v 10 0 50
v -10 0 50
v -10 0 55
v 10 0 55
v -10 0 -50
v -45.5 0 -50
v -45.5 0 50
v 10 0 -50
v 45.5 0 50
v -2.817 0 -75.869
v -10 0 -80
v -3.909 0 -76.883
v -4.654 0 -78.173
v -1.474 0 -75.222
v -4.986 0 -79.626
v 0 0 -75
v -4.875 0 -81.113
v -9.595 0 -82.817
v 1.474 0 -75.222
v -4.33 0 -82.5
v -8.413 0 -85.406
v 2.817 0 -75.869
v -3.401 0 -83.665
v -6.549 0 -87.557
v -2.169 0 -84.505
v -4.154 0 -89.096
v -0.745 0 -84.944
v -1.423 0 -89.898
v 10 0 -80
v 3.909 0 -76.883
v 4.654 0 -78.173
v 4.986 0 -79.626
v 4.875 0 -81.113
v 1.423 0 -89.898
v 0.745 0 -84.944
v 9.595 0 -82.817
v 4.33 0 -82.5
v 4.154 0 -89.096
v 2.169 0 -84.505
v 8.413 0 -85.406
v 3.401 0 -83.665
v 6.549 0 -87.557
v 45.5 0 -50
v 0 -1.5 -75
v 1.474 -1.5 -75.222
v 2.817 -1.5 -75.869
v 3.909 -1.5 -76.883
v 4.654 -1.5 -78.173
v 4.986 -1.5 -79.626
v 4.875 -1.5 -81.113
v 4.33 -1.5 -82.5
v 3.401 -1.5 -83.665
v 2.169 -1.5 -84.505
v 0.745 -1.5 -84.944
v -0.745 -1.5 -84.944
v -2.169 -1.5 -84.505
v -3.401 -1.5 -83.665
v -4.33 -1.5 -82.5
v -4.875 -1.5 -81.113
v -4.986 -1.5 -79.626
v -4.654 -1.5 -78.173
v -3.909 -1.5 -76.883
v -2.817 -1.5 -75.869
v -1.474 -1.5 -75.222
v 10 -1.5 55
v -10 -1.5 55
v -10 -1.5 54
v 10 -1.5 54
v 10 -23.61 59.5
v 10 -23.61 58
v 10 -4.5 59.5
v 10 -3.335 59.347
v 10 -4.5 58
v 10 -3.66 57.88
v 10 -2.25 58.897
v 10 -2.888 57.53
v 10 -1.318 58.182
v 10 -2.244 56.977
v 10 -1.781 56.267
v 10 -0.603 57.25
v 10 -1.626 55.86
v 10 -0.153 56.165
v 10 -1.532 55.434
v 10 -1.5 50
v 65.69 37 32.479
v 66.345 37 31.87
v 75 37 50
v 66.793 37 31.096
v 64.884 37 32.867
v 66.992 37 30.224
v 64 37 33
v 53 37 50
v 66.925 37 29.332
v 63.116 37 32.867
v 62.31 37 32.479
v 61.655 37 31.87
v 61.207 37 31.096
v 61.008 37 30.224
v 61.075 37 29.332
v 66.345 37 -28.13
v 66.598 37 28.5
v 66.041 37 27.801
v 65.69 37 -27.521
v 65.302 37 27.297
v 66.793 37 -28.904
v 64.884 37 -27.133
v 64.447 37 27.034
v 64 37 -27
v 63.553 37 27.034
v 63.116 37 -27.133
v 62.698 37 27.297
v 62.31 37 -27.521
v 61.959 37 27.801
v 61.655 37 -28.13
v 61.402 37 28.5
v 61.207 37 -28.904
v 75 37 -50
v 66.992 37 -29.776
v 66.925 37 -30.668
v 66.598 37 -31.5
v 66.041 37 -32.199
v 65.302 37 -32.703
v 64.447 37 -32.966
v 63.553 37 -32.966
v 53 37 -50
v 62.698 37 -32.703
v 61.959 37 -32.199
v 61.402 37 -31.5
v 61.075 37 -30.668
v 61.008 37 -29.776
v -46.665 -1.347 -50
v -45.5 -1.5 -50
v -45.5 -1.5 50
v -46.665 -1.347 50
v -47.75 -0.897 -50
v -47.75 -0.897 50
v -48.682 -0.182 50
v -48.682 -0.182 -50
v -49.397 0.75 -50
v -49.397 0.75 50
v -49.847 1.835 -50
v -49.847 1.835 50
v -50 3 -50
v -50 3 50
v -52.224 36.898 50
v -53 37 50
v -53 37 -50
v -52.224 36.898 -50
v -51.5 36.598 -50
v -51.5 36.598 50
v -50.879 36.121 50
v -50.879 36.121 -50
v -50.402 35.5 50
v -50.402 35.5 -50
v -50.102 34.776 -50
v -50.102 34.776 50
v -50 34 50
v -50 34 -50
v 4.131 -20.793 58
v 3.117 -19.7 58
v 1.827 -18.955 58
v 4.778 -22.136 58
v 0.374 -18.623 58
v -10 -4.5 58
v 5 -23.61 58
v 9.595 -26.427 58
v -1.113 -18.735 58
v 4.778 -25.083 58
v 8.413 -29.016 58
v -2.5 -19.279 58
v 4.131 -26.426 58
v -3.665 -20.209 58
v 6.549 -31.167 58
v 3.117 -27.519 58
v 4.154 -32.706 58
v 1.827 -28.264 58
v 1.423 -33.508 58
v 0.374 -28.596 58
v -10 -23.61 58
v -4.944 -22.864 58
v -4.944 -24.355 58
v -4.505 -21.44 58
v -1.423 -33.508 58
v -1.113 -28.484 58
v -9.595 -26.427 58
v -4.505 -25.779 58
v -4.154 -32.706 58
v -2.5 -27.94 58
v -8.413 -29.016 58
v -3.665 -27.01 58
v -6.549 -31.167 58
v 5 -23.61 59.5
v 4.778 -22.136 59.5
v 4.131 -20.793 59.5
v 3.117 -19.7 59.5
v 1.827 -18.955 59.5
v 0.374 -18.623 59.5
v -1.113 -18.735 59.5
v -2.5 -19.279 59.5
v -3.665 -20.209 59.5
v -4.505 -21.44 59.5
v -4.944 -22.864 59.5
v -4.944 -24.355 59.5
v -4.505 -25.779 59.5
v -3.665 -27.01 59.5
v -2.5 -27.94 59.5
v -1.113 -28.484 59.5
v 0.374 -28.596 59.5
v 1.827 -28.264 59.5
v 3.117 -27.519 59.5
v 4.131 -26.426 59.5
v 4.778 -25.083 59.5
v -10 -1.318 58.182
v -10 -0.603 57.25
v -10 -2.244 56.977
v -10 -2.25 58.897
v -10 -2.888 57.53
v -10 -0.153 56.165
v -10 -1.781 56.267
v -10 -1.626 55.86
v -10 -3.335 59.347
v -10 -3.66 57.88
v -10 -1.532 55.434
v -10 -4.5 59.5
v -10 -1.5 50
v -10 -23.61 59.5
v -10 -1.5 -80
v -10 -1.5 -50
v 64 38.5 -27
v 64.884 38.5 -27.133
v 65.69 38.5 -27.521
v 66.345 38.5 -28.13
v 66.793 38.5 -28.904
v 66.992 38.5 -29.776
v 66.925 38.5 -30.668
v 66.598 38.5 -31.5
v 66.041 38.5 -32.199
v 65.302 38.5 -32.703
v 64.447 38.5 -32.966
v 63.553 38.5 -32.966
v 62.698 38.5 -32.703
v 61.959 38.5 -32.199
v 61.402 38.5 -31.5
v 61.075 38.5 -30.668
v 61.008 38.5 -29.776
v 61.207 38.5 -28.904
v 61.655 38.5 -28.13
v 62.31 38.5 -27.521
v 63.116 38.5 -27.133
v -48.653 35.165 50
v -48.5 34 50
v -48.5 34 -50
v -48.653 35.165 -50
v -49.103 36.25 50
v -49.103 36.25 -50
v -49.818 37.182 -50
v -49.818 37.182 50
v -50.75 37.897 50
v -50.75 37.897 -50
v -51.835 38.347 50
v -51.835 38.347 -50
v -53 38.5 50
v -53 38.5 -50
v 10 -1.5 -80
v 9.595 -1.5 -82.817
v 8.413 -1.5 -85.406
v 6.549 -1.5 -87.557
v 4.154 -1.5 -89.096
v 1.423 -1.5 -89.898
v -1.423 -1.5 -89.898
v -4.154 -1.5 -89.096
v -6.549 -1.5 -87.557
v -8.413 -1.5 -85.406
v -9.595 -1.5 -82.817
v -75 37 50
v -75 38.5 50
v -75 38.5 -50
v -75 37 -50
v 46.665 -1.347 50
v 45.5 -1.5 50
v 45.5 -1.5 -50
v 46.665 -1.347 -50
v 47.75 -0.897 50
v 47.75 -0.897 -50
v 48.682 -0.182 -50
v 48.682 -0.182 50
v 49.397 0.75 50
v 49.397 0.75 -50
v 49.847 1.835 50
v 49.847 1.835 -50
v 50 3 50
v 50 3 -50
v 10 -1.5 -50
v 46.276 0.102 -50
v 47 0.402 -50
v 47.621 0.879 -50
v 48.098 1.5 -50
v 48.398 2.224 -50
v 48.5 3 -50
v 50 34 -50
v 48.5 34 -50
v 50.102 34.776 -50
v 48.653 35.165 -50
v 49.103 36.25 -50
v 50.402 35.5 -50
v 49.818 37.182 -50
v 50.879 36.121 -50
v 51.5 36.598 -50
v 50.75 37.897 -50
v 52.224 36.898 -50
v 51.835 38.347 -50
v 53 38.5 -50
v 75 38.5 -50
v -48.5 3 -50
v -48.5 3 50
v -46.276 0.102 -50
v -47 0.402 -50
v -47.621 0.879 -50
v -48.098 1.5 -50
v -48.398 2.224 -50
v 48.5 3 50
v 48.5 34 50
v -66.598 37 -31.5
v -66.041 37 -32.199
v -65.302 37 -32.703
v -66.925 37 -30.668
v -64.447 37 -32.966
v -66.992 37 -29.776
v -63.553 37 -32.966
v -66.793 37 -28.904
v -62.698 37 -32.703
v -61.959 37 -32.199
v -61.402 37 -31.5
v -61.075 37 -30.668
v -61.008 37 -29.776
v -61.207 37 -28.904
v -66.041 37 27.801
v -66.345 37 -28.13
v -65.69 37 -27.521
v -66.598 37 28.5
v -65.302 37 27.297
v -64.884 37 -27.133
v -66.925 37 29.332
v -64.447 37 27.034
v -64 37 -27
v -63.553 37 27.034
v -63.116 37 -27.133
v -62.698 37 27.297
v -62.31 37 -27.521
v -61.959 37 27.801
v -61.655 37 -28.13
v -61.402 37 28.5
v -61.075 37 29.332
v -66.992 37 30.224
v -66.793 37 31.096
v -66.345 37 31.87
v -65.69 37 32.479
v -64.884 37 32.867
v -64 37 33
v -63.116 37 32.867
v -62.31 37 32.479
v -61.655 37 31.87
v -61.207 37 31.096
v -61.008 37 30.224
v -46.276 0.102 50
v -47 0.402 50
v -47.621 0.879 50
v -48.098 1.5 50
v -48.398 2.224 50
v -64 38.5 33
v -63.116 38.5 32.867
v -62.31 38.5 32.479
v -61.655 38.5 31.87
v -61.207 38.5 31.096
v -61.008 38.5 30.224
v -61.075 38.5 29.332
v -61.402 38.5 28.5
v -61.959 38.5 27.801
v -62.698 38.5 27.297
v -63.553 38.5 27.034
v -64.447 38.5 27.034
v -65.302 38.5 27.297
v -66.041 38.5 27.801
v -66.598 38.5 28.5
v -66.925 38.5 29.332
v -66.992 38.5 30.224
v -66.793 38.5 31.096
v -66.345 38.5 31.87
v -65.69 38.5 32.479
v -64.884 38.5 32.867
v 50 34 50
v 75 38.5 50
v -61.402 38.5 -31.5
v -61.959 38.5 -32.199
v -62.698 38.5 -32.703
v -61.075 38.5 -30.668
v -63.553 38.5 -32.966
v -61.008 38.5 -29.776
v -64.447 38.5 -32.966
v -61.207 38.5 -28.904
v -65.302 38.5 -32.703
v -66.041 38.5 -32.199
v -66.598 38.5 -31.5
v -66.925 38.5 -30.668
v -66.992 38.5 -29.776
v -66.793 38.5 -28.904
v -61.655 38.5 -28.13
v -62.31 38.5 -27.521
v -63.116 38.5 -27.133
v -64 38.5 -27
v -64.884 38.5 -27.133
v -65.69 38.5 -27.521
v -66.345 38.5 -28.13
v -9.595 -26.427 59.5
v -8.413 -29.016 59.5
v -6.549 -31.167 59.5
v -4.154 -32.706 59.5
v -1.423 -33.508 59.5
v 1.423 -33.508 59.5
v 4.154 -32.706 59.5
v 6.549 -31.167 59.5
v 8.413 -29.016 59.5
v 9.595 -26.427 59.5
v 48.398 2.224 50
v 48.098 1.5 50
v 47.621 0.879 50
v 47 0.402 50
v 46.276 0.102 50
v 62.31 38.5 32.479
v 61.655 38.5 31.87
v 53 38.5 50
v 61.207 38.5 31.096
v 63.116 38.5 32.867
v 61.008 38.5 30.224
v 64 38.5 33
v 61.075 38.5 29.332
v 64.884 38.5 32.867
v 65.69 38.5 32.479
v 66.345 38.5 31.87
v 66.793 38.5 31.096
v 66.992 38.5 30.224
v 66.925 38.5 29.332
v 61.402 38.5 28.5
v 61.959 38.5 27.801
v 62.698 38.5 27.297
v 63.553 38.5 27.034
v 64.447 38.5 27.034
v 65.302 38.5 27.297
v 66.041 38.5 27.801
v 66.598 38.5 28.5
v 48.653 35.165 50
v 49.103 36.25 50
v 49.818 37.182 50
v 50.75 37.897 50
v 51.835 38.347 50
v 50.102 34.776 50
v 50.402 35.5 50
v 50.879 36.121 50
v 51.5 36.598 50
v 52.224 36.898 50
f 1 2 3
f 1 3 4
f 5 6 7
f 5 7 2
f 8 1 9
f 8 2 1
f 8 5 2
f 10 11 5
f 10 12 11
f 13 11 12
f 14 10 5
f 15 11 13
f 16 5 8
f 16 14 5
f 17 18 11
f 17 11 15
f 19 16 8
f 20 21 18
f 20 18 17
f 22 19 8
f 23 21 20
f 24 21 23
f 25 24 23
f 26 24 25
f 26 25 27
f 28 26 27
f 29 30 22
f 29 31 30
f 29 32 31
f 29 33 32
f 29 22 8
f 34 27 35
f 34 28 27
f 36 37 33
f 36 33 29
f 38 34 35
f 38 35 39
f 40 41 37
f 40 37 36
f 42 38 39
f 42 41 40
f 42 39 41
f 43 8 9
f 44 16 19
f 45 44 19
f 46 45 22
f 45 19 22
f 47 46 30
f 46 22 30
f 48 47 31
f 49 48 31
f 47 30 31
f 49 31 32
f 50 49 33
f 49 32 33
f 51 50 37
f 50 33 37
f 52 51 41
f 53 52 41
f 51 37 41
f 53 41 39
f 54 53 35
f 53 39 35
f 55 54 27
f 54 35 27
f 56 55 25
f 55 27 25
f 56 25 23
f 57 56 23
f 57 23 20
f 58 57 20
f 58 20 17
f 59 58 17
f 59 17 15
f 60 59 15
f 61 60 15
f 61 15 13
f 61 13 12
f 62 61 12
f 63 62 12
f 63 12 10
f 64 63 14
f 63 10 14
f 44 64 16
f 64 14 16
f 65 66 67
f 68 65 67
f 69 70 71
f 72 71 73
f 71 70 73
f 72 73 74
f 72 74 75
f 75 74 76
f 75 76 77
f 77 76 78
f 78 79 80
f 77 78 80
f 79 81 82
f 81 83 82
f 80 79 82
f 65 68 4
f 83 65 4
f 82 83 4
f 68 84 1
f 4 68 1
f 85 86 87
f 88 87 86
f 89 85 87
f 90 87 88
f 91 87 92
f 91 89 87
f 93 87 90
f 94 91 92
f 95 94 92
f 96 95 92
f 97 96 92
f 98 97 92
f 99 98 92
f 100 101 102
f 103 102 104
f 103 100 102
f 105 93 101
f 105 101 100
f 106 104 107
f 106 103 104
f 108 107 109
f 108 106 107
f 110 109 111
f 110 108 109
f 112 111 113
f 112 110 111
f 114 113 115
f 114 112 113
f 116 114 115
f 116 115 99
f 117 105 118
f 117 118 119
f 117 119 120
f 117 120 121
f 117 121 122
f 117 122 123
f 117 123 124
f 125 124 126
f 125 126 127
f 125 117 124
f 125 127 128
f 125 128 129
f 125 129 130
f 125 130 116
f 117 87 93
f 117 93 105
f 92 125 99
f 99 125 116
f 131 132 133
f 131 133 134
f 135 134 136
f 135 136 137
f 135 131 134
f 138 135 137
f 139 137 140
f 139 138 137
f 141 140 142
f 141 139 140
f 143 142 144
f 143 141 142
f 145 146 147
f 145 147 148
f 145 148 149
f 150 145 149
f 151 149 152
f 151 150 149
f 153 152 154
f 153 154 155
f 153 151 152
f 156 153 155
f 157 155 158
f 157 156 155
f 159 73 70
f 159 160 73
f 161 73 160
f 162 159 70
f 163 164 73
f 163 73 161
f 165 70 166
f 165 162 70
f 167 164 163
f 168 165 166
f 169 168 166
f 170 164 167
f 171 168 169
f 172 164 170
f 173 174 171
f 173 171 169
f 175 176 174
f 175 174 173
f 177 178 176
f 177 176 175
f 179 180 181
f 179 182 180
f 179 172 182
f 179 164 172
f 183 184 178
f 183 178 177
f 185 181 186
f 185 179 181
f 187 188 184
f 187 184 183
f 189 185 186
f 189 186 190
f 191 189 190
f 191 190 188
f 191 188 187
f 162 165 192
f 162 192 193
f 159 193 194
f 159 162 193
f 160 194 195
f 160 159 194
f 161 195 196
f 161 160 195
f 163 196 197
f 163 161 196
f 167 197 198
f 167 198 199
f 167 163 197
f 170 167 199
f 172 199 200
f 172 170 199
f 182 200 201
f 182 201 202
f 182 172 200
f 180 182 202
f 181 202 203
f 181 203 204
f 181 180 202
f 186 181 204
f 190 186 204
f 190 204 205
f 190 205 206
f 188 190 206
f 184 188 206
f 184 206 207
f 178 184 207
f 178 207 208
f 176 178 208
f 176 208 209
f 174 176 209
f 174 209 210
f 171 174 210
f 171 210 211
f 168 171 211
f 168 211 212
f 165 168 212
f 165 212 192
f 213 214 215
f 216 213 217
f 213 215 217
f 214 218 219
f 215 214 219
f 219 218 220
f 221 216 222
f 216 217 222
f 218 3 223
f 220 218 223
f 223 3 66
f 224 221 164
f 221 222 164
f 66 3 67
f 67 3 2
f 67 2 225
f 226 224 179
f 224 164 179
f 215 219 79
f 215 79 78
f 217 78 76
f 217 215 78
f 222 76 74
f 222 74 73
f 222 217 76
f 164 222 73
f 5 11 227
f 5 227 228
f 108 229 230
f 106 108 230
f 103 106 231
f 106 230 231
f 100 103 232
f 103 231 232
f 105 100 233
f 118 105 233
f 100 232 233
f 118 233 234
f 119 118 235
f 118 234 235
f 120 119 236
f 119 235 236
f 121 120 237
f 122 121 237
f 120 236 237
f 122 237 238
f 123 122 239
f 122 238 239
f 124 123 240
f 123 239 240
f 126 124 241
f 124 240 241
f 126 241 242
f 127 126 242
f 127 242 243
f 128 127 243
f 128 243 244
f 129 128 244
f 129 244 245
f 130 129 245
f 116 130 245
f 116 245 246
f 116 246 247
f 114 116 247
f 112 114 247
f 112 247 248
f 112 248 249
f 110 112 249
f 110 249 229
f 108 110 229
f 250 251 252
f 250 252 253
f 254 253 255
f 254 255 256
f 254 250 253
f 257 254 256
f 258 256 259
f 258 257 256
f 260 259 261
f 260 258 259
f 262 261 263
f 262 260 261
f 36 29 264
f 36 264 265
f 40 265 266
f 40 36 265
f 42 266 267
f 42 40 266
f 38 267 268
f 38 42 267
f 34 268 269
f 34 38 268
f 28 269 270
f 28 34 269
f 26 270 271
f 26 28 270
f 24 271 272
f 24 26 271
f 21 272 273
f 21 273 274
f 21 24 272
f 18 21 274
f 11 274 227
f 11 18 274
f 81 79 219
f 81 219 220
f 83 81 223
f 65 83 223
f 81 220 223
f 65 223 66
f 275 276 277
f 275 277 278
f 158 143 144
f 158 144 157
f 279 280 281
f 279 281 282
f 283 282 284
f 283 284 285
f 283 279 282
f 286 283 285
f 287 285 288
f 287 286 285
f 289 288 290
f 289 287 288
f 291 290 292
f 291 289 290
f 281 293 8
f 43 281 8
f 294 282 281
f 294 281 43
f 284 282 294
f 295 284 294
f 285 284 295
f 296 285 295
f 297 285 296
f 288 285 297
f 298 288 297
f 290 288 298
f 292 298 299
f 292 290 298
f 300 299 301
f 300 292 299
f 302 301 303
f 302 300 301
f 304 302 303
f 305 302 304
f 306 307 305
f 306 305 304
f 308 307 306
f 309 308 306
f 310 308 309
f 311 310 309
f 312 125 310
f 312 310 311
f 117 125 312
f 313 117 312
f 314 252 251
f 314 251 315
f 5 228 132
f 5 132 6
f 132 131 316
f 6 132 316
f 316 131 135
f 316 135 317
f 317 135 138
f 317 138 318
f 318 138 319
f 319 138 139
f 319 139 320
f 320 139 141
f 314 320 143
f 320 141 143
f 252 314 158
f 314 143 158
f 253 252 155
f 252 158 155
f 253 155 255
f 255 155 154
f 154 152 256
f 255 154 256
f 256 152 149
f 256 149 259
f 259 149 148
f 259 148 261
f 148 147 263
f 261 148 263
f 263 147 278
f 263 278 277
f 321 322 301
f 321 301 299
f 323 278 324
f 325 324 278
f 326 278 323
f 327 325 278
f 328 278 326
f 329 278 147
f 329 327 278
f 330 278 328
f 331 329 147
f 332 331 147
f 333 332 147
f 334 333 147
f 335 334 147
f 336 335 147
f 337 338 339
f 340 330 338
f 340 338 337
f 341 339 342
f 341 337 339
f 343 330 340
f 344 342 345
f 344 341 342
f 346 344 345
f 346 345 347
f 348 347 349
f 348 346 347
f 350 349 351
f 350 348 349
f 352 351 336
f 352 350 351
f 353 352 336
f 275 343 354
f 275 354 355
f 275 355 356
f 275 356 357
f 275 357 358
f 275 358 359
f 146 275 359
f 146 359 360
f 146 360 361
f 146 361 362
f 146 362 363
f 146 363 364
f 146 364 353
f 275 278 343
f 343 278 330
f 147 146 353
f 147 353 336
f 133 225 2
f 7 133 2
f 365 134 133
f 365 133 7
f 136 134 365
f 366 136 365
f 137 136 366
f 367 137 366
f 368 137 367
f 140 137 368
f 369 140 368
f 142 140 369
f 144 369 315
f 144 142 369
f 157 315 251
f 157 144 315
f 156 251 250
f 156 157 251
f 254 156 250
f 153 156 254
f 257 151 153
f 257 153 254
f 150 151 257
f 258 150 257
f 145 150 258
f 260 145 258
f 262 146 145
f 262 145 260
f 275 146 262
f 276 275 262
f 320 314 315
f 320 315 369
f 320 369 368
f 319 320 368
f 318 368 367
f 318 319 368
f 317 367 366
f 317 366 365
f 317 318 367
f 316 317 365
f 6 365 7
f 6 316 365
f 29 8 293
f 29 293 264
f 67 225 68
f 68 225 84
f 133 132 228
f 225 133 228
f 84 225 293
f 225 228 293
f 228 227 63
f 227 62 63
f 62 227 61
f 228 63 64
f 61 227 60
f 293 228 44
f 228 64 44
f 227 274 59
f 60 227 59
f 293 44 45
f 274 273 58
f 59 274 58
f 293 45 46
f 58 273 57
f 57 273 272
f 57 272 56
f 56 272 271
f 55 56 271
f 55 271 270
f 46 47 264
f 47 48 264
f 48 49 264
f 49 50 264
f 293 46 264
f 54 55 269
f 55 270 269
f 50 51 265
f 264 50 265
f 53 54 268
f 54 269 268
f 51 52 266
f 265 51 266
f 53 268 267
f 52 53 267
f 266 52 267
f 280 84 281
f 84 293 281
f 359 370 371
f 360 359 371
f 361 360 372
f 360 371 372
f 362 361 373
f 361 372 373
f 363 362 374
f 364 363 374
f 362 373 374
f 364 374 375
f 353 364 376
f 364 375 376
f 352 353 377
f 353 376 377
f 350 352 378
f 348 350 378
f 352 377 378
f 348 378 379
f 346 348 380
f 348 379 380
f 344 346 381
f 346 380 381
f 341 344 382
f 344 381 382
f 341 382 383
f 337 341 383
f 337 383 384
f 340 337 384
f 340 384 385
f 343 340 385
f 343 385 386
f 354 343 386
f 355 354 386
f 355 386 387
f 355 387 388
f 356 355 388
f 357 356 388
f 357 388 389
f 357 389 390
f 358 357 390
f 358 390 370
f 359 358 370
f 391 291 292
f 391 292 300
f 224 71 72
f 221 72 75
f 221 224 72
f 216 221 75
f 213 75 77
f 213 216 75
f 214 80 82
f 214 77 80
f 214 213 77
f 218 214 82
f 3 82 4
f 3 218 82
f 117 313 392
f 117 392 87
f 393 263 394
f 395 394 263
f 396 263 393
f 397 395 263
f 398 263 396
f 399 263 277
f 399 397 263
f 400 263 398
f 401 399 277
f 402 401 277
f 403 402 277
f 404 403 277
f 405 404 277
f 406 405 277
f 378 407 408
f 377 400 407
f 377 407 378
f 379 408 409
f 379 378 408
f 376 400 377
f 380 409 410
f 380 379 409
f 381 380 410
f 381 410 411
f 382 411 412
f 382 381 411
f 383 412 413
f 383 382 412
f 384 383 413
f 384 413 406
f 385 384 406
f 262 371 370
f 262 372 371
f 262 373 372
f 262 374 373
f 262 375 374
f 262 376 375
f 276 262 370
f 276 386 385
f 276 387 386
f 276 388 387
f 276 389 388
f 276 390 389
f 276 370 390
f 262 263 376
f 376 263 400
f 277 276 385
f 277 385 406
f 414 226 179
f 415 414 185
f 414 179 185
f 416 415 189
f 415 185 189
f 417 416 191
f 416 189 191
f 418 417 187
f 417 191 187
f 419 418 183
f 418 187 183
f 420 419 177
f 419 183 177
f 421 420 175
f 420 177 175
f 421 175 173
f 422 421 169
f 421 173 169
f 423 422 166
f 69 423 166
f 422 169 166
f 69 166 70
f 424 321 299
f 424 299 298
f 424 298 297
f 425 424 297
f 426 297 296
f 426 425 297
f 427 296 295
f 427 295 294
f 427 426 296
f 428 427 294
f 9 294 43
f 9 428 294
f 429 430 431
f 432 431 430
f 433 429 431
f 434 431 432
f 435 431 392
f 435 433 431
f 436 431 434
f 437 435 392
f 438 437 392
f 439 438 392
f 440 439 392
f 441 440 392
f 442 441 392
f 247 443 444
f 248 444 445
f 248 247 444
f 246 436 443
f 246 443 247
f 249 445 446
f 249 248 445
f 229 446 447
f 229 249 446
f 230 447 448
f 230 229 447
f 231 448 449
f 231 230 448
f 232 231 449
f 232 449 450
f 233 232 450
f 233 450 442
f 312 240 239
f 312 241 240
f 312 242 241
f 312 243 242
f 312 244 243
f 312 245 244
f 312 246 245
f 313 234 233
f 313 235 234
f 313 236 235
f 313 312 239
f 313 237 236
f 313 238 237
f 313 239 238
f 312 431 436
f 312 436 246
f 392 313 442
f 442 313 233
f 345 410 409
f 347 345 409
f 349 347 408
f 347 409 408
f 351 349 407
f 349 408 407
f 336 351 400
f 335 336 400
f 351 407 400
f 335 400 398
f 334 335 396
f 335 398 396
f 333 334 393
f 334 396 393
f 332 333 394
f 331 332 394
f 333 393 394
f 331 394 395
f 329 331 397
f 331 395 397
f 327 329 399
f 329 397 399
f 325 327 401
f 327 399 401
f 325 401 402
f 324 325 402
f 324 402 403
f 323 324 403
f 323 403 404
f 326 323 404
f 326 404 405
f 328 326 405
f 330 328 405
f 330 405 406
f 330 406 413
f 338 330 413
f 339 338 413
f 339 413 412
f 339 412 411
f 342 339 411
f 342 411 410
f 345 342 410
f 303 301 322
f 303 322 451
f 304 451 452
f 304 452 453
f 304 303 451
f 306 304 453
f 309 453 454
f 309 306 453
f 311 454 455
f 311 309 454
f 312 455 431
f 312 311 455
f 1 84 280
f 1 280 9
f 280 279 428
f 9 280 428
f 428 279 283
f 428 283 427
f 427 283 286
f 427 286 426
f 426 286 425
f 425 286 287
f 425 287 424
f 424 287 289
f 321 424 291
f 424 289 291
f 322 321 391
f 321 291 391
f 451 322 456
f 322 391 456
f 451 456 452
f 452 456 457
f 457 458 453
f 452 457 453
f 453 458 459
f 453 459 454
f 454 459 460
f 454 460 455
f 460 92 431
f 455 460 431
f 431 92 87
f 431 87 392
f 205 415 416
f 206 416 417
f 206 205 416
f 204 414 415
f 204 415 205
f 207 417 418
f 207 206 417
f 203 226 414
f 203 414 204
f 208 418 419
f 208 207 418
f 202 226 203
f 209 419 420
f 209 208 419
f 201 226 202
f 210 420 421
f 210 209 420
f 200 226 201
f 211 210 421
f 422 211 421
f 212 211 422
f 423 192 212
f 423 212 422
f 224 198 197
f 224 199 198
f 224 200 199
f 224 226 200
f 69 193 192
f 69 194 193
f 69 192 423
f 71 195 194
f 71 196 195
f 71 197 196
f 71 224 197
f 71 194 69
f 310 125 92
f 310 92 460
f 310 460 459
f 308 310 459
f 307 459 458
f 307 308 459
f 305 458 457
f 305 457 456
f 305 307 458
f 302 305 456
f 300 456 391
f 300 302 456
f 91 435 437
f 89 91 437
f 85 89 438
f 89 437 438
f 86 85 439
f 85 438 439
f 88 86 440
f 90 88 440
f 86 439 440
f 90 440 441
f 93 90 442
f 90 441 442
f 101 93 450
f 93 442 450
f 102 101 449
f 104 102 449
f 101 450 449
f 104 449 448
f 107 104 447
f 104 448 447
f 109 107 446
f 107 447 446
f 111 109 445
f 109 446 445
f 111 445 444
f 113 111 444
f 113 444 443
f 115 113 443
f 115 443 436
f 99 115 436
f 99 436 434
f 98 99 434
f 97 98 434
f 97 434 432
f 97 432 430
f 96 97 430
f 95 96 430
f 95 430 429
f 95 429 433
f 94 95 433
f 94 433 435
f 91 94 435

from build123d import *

# Parameters (mm, degrees)
SKETCH1_R                      = 5
BASE_FLANGE1_DEPTH             = 1.5
EDGE_FLANGE1_STRIP_W           = 12
EDGE_FLANGE1_STRIP_H           = 1.5
EDGE_FLANGE1_STRIP_CUT_DEPTH   = 100
EDGE_FLANGE1_STRIP_2_W         = 12
EDGE_FLANGE1_STRIP_2_H         = 1.5
EDGE_FLANGE1_STRIP_CUT_2_DEPTH = 100
EDGE_FLANGE1_DEPTH             = 100
EDGE_FLANGE1_BEND_DEPTH        = 100
EDGE_FLANGE2_STRIP_W           = 12
EDGE_FLANGE2_STRIP_H           = 1.5
EDGE_FLANGE2_STRIP_CUT_DEPTH   = 100
EDGE_FLANGE2_STRIP_2_W         = 12
EDGE_FLANGE2_STRIP_2_H         = 1.5
EDGE_FLANGE2_STRIP_CUT_2_DEPTH = 100
EDGE_FLANGE2_DEPTH             = 100
EDGE_FLANGE2_BEND_DEPTH        = 100
SKETCHED_START                 = 58.9178
SKETCHED_BEND1_OUTLINE_W       = 20
SKETCHED_BEND1_OUTLINE_H       = 1.5
SKETCHED_BEND1_DEPTH           = 32.0822
SKETCHED_START_2               = 56.266894772
SKETCHED_BEND1_2_OUTLINE_R     = 5
SKETCHED_BEND1_2_DEPTH         = 3.233105228
SKETCHED_START_3               = -10
SKETCHED_BEND1_3_DEPTH         = 20
SKETCHED_BEND1_4_DEPTH         = 20
SKETCH21_R                     = 3
CUT_EXTRUDE1_DEPTH             = 10


with BuildPart() as part:
    # Base-Flange1: sheet metal written as solids
    # Sketch1 → Base-Flange1 (new body)
    with BuildSketch(Plane(origin=(0, 0, 0), x_dir=(1, 0, 0), z_dir=(0, 1, 0))):
        with BuildLine():
            Line((10, 50), (10, 80))
            ThreePointArc((10, 80), (0, 90), (-10, 80))
            Line((-10, 80), (-10, 50))
            Line((-10, 50), (-50, 50))
            Line((-50, 50), (-50, -50))
            Line((-50, -50), (-10, -50))
            Line((-10, -50), (-10, -80))
            ThreePointArc((-10, -80), (0, -90), (10, -80))
            Line((10, -80), (10, -50))
            Line((10, -50), (50, -50))
            Line((50, -50), (50, 50))
            Line((50, 50), (10, 50))
        make_face()
        with Locations(Location((0, 80, 0), (0, 0, 270))):
            Circle(SKETCH1_R, mode=Mode.SUBTRACT)
        with Locations(Location((0, -80, 0), (0, 0, 270))):
            Circle(SKETCH1_R, mode=Mode.SUBTRACT)
    extrude(amount=-BASE_FLANGE1_DEPTH)

    # Edge-Flange1: sheet metal written as solids
    # Edge-Flange1 strip (on a plane across the edge) → Edge-Flange1 strip cut (cut)
    with BuildSketch(Plane(origin=(-50, 0, -50), x_dir=(1, 0, 0), z_dir=(0, 0, 1))):
        with Locations((-1.5, -0.75)):
            Rectangle(EDGE_FLANGE1_STRIP_W, EDGE_FLANGE1_STRIP_H)
    extrude(amount=EDGE_FLANGE1_STRIP_CUT_DEPTH, mode=Mode.SUBTRACT)

    # Edge-Flange1 strip 2 (on a plane across the edge) → Edge-Flange1 strip cut 2 (cut)
    with BuildSketch(Plane(origin=(50, 0, 50), x_dir=(-1, 0, 0), z_dir=(0, 0, -1))):
        with Locations((-1.5, -0.75)):
            Rectangle(EDGE_FLANGE1_STRIP_2_W, EDGE_FLANGE1_STRIP_2_H)
    extrude(amount=EDGE_FLANGE1_STRIP_CUT_2_DEPTH, mode=Mode.SUBTRACT)

    # Edge-Flange1 section (on a plane across the edge) → Edge-Flange1 (add)
    with BuildSketch(Plane(origin=(-50, 0, -50), x_dir=(1, 0, 0), z_dir=(0, 0, 1))):
        with BuildLine():
            Line((0, 3), (0, 38.5))
            Line((0, 38.5), (1.5, 38.5))
            Line((1.5, 38.5), (1.5, 3))
            ThreePointArc((1.5, 3), (2.378679656, 0.878679656), (4.5, 0))
            Line((4.5, 0), (4.5, -1.5))
            ThreePointArc((4.5, -1.5), (1.318019485, -0.181980515), (0, 3))
        make_face()
    extrude(amount=EDGE_FLANGE1_DEPTH)

    # Edge-Flange1 section 2 (on a plane across the edge) → Edge-Flange1 bend (add)
    with BuildSketch(Plane(origin=(50, 0, 50), x_dir=(-1, 0, 0), z_dir=(0, 0, -1))):
        with BuildLine():
            Line((0, 3), (0, 38.5))
            Line((0, 38.5), (1.5, 38.5))
            Line((1.5, 38.5), (1.5, 3))
            ThreePointArc((1.5, 3), (2.378679656, 0.878679656), (4.5, 0))
            Line((4.5, 0), (4.5, -1.5))
            ThreePointArc((4.5, -1.5), (1.318019485, -0.181980515), (0, 3))
        make_face()
    extrude(amount=EDGE_FLANGE1_BEND_DEPTH)

    # Edge-Flange2: sheet metal written as solids
    # Edge-Flange2 strip (on a plane across the edge) → Edge-Flange2 strip cut (cut)
    with BuildSketch(Plane(origin=(-50, 38.5, 50), x_dir=(0, -1, 0), z_dir=(0, 0, -1))):
        with Locations((-1.5, -0.75)):
            Rectangle(EDGE_FLANGE2_STRIP_W, EDGE_FLANGE2_STRIP_H)
    extrude(amount=EDGE_FLANGE2_STRIP_CUT_DEPTH, mode=Mode.SUBTRACT)

    # Edge-Flange2 strip 2 (on a plane across the edge) → Edge-Flange2 strip cut 2 (cut)
    with BuildSketch(Plane(origin=(50, 38.5, -50), x_dir=(0, -1, 0), z_dir=(0, 0, 1))):
        with Locations((-1.5, -0.75)):
            Rectangle(EDGE_FLANGE2_STRIP_2_W, EDGE_FLANGE2_STRIP_2_H)
    extrude(amount=EDGE_FLANGE2_STRIP_CUT_2_DEPTH, mode=Mode.SUBTRACT)

    # Edge-Flange2 section (on a plane across the edge) → Edge-Flange2 (add)
    with BuildSketch(Plane(origin=(-50, 38.5, 50), x_dir=(0, -1, 0), z_dir=(0, 0, -1))):
        with BuildLine():
            Line((0, 3), (0, 25))
            Line((0, 25), (1.5, 25))
            Line((1.5, 25), (1.5, 3))
            ThreePointArc((1.5, 3), (2.378679656, 0.878679656), (4.5, 0))
            Line((4.5, 0), (4.5, -1.5))
            ThreePointArc((4.5, -1.5), (1.318019485, -0.181980515), (0, 3))
        make_face()
    extrude(amount=EDGE_FLANGE2_DEPTH)

    # Edge-Flange2 section 2 (on a plane across the edge) → Edge-Flange2 bend (add)
    with BuildSketch(Plane(origin=(50, 38.5, -50), x_dir=(0, -1, 0), z_dir=(0, 0, 1))):
        with BuildLine():
            Line((0, 3), (0, 25))
            Line((0, 25), (1.5, 25))
            Line((1.5, 25), (1.5, 3))
            ThreePointArc((1.5, 3), (2.378679656, 0.878679656), (4.5, 0))
            Line((4.5, 0), (4.5, -1.5))
            ThreePointArc((4.5, -1.5), (1.318019485, -0.181980515), (0, 3))
        make_face()
    extrude(amount=EDGE_FLANGE2_BEND_DEPTH)

    # Sketched Bend1: read off the stored shape, not the designer's step
    # Sketched Bend1 outline → Sketched Bend1 (cut)
    with BuildSketch(Plane.XY.offset(SKETCHED_START)):
        with Locations((0, -0.75)):
            Rectangle(SKETCHED_BEND1_OUTLINE_W, SKETCHED_BEND1_OUTLINE_H)
    extrude(amount=SKETCHED_BEND1_DEPTH, mode=Mode.SUBTRACT)

    # Sketched Bend1 2 outline → Sketched Bend1 2 (add)
    with BuildSketch(Plane.XY.offset(SKETCHED_START_2)):
        with BuildLine():
            Line((10, -23.609513775), (10, -1.5))
            Line((10, -1.5), (-10, -1.5))
            Line((-10, -1.5), (-10, -23.609513775))
            ThreePointArc((-10, -23.609513775), (0, -33.609513775), (10, -23.609513775))
        make_face()
        with Locations((0, -23.609513775)):
            Circle(SKETCHED_BEND1_2_OUTLINE_R, mode=Mode.SUBTRACT)
    extrude(amount=SKETCHED_BEND1_2_DEPTH)

    # Sketched Bend1 3 outline → Sketched Bend1 3 (cut)
    with BuildSketch(Plane.YZ.offset(SKETCHED_START_3)):
        with BuildLine():
            ThreePointArc((-1.780629183, 56.266894772), (-2.887654552, 57.529889753), (-4.5, 58))
            Line((-4.5, 58), (-35, 58))
            Line((-35, 58), (-35, 56.266894772))
            Line((-35, 56.266894772), (-1.780629183, 56.266894772))
        make_face()
        with BuildLine():
            Line((1, 54), (1, 58.9178))
            Line((1, 58.9178), (-1.5, 58.9178))
            Line((-1.5, 58.9178), (-1.5, 61))
            Line((-1.5, 61), (-35, 61))
            Line((-35, 61), (-35, 59.500000008))
            Line((-35, 59.500000008), (-4.5, 59.5))
            ThreePointArc((-4.5, 59.5), (-1.318019485, 58.181980515), (0, 55))
            Line((0, 55), (0, 54))
            Line((0, 54), (1, 54))
        make_face()
    extrude(amount=SKETCHED_BEND1_3_DEPTH, mode=Mode.SUBTRACT)

    # Sketched Bend1 4 outline → Sketched Bend1 4 (add)
    with BuildSketch(Plane.YZ.offset(SKETCHED_START_3)):
        with BuildLine():
            Line((-0.182016948, 56.266894772), (-1.780629183, 56.266894772))
            ThreePointArc((-1.780629183, 56.266894772), (-1.570997401, 55.6488018), (-1.5, 55))
            Line((-1.5, 55), (-1.500000001, 54))
            Line((-1.500000001, 54), (0, 54))
            Line((0, 54), (0, 55))
            ThreePointArc((0, 55), (-0.045736664, 55.639951665), (-0.182016948, 56.266894772))
        make_face()
    extrude(amount=SKETCHED_BEND1_4_DEPTH)

    # Sketch21 → Cut-Extrude1 (cut)
    with BuildSketch(Plane(origin=(0, 38.5, 0), x_dir=(1, 0, 0), z_dir=(0, 1, 0))):
        with Locations(Location((-64, 30, 0), (0, 0, 270))):
            Circle(SKETCH21_R)
        with Locations(Location((-64, -30, 0), (0, 0, 270))):
            Circle(SKETCH21_R)
        with Locations(Location((64, 30, 0), (0, 0, 270))):
            Circle(SKETCH21_R)
        with Locations(Location((64, -30, 0), (0, 0, 270))):
            Circle(SKETCH21_R)
    extrude(amount=-CUT_EXTRUDE1_DEPTH, mode=Mode.SUBTRACT)


solid = part.part
